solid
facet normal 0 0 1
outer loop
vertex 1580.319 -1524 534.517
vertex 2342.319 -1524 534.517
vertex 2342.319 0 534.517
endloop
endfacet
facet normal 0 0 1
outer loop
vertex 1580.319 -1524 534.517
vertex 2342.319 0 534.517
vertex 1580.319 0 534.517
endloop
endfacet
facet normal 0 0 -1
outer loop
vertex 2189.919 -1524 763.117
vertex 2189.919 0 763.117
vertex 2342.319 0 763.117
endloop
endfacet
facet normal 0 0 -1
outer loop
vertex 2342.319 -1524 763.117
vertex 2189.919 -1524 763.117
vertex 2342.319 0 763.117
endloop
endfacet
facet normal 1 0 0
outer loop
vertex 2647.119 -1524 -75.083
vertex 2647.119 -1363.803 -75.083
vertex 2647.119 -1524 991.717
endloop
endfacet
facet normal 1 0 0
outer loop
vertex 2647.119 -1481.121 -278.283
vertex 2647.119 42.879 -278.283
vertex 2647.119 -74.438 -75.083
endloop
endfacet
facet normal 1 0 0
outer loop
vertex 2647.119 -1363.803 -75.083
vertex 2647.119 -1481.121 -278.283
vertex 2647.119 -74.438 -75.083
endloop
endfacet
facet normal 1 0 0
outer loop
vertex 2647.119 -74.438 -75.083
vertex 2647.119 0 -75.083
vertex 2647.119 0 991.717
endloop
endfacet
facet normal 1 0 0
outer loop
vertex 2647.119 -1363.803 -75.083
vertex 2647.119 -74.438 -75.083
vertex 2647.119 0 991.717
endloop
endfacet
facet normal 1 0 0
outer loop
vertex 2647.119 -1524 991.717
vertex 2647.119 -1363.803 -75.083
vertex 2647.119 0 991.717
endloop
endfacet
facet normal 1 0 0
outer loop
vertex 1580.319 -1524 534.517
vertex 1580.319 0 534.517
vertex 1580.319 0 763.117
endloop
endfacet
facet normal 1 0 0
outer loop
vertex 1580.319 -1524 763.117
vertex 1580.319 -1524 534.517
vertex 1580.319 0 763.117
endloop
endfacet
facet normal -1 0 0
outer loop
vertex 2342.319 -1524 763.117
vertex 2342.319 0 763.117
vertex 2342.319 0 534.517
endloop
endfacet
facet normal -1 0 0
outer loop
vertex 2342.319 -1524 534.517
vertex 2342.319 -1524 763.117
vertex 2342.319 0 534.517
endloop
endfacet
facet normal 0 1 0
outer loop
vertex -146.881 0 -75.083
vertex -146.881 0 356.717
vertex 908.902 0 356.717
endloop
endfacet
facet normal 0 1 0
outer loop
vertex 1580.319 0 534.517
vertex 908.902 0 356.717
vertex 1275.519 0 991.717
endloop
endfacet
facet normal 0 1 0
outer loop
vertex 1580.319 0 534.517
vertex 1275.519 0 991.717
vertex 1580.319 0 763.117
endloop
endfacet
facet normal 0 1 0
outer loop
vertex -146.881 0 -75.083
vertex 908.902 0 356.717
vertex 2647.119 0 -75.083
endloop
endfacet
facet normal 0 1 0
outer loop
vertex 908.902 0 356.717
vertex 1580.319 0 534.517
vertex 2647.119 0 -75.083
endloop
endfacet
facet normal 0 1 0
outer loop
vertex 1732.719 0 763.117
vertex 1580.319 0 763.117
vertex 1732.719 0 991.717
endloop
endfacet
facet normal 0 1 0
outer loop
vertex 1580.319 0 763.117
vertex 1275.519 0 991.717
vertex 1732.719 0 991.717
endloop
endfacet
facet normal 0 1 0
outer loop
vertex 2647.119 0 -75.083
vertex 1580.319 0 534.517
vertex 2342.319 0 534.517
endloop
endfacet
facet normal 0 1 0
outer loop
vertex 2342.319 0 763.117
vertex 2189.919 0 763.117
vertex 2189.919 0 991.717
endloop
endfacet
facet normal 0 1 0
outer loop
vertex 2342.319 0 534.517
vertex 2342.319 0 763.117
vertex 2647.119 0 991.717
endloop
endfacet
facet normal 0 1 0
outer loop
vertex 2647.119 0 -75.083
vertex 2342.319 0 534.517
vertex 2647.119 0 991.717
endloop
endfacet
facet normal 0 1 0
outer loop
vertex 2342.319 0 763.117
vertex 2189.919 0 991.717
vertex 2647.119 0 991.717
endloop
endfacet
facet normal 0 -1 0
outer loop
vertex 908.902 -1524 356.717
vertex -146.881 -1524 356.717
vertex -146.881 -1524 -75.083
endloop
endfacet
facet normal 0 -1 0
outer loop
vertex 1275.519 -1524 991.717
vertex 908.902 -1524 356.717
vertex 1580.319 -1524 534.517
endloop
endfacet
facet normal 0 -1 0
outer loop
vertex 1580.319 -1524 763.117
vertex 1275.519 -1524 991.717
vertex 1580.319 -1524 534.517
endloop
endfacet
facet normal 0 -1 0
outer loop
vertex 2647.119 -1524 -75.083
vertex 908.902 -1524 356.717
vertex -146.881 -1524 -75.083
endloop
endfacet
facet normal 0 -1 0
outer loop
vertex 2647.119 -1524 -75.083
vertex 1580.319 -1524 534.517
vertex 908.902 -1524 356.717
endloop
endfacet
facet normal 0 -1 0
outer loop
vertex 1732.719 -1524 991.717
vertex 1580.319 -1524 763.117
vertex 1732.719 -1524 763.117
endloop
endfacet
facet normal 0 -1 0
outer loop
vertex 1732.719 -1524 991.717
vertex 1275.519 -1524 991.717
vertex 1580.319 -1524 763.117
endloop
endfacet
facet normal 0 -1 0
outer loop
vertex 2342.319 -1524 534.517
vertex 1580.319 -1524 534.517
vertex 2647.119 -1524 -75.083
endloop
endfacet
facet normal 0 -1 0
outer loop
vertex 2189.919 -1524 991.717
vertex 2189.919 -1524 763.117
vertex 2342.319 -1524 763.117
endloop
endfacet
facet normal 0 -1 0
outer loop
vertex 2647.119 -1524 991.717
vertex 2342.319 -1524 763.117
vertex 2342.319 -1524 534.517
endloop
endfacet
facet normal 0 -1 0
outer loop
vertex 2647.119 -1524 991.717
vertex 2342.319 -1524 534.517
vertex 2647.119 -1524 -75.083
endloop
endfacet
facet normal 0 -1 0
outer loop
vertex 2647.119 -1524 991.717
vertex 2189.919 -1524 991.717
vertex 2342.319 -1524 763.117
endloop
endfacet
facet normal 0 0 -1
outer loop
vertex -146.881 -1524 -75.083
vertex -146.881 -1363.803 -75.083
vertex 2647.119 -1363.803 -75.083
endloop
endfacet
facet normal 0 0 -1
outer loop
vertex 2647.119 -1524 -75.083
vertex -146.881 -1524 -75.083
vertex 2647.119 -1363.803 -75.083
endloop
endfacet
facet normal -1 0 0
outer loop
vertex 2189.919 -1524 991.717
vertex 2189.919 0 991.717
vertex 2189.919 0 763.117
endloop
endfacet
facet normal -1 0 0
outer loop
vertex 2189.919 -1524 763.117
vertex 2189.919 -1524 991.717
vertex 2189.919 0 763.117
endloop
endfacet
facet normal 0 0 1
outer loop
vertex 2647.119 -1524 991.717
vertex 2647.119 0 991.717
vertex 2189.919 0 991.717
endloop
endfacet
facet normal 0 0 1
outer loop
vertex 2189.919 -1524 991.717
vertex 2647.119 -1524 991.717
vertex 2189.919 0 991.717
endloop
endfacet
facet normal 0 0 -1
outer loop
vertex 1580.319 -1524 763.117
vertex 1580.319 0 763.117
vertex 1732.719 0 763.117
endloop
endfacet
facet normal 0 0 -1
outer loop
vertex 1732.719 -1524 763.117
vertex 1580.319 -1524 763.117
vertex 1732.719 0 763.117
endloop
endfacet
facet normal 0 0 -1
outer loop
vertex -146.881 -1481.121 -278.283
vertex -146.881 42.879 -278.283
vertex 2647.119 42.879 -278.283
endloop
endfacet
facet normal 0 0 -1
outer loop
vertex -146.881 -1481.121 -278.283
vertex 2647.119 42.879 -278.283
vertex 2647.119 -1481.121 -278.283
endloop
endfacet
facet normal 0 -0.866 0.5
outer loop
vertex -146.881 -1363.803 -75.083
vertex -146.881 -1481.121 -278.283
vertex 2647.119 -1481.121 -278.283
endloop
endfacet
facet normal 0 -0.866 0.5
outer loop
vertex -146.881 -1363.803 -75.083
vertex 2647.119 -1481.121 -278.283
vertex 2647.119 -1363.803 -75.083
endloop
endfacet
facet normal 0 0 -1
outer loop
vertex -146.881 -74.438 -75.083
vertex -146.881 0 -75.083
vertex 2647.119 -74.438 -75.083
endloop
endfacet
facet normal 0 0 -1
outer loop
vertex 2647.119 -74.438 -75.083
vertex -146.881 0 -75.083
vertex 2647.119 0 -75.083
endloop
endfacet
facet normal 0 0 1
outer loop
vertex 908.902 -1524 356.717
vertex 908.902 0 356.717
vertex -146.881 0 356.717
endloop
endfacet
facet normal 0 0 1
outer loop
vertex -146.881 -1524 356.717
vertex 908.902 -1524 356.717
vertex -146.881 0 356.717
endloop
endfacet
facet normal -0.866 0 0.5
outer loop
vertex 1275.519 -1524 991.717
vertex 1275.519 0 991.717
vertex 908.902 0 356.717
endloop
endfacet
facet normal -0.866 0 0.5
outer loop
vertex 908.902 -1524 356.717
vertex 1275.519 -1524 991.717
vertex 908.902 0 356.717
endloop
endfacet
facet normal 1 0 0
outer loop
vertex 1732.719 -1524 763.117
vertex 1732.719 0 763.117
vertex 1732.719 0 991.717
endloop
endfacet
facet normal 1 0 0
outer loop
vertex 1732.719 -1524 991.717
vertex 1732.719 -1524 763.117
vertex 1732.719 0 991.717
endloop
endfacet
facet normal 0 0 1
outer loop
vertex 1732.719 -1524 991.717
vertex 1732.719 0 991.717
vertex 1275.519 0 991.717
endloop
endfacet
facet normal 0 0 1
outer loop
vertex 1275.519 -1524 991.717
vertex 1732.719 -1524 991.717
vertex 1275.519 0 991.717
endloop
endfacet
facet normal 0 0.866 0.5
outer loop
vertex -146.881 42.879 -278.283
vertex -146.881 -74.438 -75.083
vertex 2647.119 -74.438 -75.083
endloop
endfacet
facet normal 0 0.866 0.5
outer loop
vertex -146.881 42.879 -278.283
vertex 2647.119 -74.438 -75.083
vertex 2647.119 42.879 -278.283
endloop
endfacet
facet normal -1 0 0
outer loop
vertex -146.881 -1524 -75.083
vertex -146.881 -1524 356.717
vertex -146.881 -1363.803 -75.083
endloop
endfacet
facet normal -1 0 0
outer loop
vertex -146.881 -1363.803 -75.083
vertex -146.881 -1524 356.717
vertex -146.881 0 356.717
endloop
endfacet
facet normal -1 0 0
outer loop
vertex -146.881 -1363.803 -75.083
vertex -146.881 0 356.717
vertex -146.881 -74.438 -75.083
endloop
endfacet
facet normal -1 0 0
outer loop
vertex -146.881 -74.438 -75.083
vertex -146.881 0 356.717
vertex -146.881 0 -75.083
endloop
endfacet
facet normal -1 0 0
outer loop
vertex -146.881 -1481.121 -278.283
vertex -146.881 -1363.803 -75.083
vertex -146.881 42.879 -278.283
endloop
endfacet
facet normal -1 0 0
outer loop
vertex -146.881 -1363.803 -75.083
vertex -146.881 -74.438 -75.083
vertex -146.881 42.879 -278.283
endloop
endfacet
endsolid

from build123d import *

# Parameters (mm, degrees)
F1_DEPTH = 1524
F3_DEPTH = 2794


with BuildPart() as f1:
    # F0 (on Front) → F1 (new body)
    with BuildSketch(Plane.XZ):
        Polygon((-146.880522, 356.717303), (-146.880522, -75.082697), (2647.119478, -75.082697), (2647.119478, 991.717303), (2189.919478, 991.717303), (2189.919478, 763.117303), (2342.319478, 763.117303), (2342.319478, 534.517303), (1580.319478, 534.517303), (1580.319478, 763.117303), (1732.719478, 763.117303), (1732.719478, 991.717303), (1275.519478, 991.717303), (908.902057, 356.717303), align=None)
    extrude(amount=F1_DEPTH)

    # F2 (on face) → F3 (join)
    with BuildSketch(Plane(origin=(-146.880522, 0, 0), x_dir=(0, -1, 0), z_dir=(-1, 0, 0))):
        Polygon((-42.879277, -278.282697), (1481.120723, -278.282697), (1363.803148, -75.082697), (74.438298, -75.082697), align=None)
    extrude(amount=-F3_DEPTH)


solid = f1.part
